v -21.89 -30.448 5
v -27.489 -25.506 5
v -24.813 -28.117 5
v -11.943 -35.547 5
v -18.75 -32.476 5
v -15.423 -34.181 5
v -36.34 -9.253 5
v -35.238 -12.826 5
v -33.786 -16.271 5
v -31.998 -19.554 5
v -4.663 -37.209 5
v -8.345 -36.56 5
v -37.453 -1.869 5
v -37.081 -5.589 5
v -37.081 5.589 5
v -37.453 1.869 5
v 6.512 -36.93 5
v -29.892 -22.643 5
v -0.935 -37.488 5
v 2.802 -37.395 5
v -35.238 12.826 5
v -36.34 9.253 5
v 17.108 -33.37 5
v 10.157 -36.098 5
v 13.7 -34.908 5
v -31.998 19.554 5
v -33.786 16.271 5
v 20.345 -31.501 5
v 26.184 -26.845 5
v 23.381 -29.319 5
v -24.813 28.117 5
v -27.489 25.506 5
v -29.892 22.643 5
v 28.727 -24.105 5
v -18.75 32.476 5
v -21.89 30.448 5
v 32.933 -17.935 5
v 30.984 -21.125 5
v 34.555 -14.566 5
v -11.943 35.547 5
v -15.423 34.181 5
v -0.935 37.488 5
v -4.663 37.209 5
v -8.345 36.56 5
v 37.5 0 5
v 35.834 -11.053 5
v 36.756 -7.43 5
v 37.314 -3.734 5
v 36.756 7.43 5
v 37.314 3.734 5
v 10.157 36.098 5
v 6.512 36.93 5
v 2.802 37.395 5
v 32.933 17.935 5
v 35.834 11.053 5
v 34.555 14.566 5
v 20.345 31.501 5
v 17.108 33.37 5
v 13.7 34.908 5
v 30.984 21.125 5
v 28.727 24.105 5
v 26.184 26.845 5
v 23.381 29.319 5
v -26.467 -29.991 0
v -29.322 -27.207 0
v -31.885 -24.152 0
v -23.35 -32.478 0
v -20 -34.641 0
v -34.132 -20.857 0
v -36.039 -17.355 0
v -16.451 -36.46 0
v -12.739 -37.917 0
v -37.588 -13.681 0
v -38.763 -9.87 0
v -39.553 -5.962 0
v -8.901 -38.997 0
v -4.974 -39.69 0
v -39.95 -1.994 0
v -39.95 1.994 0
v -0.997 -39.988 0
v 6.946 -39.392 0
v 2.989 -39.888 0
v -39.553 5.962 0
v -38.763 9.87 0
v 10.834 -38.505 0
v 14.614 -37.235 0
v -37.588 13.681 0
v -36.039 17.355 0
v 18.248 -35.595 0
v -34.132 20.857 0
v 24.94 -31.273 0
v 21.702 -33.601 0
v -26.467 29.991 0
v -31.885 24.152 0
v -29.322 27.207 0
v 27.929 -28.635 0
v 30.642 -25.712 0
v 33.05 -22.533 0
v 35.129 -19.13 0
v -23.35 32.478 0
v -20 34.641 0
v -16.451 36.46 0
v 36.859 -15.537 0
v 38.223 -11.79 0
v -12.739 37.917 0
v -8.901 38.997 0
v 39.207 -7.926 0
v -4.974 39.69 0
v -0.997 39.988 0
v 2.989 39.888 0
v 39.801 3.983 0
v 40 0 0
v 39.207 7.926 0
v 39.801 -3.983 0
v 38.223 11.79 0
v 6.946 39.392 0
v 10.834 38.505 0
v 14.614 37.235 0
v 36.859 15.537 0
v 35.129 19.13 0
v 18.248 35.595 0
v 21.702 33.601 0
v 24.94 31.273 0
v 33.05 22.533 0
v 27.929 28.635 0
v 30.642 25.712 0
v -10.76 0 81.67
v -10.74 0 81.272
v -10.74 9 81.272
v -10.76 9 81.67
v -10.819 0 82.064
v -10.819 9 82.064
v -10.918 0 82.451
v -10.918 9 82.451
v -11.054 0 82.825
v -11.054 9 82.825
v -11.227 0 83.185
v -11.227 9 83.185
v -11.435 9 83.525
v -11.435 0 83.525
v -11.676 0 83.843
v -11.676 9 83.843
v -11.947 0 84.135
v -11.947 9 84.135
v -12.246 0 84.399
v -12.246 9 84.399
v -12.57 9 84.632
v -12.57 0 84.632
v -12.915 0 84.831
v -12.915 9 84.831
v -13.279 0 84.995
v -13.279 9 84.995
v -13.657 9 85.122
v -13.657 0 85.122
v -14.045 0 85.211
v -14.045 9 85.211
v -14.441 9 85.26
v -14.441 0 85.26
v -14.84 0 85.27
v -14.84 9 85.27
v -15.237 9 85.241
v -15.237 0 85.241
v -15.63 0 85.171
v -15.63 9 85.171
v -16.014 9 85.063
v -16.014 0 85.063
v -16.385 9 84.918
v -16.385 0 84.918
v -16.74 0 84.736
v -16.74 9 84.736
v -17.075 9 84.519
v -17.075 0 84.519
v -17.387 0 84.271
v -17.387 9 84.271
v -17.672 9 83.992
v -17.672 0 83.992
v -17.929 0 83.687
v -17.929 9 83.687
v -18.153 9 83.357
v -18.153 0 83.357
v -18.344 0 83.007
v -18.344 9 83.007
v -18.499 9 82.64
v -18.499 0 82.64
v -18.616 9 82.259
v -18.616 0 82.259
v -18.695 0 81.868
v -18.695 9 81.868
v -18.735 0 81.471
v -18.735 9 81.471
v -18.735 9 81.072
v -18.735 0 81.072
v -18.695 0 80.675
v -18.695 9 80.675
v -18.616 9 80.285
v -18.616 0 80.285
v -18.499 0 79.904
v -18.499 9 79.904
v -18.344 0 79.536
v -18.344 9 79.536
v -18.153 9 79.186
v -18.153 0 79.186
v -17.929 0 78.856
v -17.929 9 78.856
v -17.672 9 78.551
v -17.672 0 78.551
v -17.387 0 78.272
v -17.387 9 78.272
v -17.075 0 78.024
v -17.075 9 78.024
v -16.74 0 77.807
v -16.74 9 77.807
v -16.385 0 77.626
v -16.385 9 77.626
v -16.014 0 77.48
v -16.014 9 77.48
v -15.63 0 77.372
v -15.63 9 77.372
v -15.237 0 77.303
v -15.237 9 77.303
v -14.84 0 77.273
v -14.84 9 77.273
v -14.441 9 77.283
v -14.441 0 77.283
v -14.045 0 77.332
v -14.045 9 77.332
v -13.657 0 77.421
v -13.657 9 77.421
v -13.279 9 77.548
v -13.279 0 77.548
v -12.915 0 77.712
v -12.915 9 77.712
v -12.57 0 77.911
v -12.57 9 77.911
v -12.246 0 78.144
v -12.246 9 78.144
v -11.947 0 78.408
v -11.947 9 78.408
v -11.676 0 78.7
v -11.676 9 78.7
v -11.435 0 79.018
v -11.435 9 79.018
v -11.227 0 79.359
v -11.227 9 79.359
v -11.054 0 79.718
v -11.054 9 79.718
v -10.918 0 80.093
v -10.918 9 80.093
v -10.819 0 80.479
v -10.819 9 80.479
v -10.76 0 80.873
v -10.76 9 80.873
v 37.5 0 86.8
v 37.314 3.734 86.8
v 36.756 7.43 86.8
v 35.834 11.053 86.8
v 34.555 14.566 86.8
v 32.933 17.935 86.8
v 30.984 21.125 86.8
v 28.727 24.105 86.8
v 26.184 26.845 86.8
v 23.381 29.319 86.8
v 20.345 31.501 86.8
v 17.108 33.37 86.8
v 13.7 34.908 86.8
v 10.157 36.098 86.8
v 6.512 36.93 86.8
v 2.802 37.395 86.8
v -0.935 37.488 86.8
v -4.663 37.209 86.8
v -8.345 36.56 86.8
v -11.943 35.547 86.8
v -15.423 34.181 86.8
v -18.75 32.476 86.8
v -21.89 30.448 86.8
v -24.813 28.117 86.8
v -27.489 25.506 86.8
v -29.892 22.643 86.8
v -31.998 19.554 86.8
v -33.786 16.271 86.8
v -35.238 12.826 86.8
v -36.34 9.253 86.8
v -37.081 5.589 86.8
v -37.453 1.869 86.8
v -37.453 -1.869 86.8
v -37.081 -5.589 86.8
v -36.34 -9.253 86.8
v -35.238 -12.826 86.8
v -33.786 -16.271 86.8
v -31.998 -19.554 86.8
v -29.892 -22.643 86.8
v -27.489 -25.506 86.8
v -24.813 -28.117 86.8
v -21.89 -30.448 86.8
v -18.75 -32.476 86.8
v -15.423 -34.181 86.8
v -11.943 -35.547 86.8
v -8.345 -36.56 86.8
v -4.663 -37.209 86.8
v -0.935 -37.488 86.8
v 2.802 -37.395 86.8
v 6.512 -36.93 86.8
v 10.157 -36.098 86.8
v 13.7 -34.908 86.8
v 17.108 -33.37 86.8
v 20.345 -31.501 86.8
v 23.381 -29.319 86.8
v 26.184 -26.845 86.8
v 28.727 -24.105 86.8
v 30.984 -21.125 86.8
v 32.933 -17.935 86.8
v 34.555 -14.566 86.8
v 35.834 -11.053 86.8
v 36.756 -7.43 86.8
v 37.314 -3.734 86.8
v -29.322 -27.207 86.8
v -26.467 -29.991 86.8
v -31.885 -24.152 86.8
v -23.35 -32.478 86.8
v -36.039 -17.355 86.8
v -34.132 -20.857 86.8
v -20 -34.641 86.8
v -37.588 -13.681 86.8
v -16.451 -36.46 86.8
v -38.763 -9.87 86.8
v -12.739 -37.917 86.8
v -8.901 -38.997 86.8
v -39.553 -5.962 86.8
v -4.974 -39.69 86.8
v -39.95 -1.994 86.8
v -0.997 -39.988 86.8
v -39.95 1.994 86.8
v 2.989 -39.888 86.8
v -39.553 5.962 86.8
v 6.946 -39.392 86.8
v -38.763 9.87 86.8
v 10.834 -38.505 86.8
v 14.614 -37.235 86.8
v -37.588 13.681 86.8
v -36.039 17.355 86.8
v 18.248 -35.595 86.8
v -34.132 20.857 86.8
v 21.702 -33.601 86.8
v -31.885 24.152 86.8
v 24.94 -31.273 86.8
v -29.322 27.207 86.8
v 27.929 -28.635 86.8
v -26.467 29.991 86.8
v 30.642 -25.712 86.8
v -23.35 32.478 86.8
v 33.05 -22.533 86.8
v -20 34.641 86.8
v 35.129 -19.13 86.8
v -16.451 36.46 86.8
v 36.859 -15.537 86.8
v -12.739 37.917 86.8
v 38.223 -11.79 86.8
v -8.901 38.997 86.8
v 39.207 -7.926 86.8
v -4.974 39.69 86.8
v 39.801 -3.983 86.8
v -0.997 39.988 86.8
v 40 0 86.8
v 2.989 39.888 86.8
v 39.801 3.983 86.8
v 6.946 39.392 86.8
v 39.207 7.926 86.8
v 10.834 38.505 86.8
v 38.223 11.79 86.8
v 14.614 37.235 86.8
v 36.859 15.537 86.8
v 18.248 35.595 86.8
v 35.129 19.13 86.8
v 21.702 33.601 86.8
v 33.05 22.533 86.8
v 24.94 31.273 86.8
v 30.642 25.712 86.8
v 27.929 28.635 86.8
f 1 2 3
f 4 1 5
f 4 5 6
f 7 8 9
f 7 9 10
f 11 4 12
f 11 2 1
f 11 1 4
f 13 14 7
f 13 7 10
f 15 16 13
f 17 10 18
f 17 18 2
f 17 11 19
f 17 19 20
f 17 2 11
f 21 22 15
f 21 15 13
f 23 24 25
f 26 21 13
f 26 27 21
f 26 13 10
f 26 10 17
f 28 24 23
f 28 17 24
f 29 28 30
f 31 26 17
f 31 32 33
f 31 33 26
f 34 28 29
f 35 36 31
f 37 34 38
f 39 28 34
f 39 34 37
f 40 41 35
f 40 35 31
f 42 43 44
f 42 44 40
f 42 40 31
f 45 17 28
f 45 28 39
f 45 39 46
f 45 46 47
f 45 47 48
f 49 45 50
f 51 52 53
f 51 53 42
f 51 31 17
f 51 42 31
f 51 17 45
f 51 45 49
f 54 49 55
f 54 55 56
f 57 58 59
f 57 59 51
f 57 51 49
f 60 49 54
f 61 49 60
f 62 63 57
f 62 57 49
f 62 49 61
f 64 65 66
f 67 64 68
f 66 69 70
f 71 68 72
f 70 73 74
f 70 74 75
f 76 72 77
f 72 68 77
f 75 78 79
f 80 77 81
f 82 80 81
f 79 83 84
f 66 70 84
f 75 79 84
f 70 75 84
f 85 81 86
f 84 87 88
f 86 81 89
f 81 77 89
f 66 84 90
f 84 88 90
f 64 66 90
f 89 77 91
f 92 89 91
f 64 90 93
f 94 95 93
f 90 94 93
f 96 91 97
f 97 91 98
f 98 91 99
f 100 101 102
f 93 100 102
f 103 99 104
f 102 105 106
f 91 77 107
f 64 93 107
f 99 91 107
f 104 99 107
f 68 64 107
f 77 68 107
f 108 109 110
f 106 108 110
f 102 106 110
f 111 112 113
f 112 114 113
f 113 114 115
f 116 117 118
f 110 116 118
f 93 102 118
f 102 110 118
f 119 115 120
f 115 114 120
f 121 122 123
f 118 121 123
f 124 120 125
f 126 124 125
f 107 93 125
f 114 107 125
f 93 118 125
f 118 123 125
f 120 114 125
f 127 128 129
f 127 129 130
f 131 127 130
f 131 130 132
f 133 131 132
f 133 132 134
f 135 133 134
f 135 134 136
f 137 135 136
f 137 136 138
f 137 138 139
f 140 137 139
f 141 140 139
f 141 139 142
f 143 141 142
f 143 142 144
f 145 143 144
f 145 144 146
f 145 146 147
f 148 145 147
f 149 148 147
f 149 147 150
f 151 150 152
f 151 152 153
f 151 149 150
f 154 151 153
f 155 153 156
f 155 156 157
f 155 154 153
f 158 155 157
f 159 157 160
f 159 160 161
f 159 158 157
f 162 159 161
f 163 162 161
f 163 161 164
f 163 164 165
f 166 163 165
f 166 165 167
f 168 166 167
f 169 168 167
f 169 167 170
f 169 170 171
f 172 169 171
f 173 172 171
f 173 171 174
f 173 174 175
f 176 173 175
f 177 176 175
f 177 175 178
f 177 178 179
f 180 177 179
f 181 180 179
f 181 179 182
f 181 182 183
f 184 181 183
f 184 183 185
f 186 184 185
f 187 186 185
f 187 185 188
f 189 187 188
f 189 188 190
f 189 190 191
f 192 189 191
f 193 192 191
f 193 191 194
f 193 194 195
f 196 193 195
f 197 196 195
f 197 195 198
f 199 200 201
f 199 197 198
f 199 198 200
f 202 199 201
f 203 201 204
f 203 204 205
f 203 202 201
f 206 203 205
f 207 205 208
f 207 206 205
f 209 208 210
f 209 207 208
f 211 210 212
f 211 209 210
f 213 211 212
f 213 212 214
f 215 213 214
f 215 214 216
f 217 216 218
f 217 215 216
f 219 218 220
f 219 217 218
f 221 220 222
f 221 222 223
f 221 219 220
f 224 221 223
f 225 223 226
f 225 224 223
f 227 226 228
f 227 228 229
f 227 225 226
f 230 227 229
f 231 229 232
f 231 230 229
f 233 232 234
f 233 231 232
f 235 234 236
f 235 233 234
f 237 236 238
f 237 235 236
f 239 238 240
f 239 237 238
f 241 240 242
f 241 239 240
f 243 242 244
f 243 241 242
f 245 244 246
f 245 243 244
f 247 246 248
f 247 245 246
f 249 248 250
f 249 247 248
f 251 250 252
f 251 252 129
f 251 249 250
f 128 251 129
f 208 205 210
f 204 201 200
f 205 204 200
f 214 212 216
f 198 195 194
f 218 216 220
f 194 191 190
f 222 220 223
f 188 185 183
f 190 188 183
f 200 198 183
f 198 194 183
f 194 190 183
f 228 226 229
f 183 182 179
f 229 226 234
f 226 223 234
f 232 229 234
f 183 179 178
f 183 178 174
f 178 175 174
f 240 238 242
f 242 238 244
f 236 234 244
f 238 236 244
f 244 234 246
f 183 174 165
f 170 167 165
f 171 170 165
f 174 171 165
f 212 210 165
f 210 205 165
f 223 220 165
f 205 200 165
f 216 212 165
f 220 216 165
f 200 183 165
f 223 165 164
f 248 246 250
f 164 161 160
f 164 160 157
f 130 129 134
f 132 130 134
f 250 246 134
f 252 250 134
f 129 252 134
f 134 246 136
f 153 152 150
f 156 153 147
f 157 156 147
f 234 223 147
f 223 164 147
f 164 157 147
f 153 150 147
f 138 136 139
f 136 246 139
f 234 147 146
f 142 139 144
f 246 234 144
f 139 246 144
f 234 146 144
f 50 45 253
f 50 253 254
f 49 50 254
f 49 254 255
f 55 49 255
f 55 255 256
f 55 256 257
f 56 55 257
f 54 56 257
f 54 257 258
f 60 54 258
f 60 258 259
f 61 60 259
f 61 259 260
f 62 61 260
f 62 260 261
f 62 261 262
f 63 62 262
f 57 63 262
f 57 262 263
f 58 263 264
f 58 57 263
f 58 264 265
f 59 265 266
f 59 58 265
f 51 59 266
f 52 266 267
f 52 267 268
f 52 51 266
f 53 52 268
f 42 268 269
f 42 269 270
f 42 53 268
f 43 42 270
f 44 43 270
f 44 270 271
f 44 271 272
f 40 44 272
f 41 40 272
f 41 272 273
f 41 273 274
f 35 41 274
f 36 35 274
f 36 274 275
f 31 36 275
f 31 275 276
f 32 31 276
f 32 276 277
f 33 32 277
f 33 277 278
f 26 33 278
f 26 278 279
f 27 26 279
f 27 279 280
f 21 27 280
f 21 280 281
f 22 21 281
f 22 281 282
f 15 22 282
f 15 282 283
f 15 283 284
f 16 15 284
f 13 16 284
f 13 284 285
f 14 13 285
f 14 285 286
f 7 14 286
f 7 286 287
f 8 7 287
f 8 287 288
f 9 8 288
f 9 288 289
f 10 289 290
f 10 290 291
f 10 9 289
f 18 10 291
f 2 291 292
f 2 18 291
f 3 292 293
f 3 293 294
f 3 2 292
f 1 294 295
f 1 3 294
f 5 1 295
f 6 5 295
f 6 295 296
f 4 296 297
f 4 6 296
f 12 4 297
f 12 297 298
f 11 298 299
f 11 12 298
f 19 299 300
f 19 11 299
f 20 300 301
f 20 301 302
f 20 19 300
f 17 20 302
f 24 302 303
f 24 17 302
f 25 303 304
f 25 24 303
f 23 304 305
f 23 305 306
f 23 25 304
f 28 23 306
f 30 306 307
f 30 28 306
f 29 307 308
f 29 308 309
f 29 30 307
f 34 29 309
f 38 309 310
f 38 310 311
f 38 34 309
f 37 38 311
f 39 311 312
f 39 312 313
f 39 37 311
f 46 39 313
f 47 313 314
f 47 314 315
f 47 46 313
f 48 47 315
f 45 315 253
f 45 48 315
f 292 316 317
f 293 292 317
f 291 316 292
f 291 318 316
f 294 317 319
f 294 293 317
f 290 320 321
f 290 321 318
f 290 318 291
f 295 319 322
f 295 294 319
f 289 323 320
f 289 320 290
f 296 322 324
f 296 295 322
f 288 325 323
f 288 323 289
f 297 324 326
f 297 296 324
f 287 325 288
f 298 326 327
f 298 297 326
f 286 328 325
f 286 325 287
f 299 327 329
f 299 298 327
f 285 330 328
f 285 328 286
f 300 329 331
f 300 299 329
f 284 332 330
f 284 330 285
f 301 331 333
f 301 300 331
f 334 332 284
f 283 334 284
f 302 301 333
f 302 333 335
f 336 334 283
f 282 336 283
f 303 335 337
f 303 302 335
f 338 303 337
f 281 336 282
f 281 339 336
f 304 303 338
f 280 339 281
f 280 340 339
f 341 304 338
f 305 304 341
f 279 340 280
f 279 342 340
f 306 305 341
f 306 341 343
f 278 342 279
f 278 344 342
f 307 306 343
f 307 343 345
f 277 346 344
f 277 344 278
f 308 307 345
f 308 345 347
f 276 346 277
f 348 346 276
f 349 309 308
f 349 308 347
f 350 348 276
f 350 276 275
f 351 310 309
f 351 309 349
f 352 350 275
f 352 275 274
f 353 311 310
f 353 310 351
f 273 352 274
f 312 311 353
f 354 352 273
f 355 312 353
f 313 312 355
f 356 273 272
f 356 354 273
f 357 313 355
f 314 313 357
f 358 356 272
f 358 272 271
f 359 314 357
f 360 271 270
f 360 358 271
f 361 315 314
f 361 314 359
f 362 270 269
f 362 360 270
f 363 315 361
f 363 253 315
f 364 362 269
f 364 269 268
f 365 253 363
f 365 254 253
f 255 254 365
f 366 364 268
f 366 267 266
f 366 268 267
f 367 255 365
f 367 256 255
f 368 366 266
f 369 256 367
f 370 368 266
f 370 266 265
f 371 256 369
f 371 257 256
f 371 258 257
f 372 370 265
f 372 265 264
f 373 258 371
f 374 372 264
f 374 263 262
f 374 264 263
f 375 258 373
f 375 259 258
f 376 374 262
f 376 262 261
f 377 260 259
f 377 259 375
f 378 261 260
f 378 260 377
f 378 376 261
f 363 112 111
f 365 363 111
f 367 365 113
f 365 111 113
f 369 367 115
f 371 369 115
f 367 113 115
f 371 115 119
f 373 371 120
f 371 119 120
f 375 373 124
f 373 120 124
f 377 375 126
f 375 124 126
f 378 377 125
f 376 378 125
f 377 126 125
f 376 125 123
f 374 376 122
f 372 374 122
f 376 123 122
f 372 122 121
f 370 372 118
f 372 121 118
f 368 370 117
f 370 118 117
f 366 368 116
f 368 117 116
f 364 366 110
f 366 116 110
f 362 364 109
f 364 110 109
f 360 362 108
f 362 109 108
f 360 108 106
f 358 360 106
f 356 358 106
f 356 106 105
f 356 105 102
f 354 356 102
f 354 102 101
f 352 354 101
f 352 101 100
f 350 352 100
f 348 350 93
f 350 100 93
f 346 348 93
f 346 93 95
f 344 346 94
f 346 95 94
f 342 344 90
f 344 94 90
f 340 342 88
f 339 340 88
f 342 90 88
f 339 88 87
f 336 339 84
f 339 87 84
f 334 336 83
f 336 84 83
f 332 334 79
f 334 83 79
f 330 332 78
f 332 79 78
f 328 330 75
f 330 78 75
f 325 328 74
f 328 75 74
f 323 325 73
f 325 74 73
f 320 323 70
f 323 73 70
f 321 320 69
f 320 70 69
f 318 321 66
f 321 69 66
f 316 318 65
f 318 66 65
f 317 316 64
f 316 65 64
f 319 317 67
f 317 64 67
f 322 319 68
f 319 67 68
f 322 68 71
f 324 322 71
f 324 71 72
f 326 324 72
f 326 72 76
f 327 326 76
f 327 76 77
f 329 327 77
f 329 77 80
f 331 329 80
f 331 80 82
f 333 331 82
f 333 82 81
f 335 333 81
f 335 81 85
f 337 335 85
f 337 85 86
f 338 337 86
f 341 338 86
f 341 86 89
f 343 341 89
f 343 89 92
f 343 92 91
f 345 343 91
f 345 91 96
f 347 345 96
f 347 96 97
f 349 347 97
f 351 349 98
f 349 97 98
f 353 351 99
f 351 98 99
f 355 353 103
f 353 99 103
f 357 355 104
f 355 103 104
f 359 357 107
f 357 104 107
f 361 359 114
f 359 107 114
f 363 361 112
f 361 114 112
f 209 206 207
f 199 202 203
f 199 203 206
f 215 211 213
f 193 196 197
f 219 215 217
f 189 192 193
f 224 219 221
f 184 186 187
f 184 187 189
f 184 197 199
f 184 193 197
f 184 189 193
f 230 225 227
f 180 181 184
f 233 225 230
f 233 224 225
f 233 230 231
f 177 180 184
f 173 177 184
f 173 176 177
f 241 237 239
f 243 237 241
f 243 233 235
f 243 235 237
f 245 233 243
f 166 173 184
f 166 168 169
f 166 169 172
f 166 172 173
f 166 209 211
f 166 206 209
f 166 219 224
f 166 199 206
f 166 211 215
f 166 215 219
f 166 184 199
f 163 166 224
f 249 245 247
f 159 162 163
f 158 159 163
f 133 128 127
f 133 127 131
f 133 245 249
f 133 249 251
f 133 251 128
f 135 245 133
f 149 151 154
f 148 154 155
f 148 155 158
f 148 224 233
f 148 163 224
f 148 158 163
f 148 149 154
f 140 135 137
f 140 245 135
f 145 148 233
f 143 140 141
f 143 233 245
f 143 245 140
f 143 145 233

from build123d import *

# Parameters (mm, degrees)
F0_R     = 40
F0_R_2   = 37.5
F2_DEPTH = 86.8
F1_R     = 37.5
F3_DEPTH = 5
F4_R     = 4
F5_DEPTH = 1
F6_DEPTH = 9


with BuildPart() as f2:
    # F0 (on Top) → F2 (new body)
    with BuildSketch(Plane.XY):
        Circle(F0_R)
        Circle(F0_R_2, mode=Mode.SUBTRACT)
    extrude(amount=F2_DEPTH)

    # F1 (on face) → F3 (join)
    with BuildSketch(Plane.XY):
        Circle(F1_R)
    extrude(amount=F3_DEPTH)


with BuildPart() as f5:
    # F4 (on Front) → F5 (new body)
    with BuildSketch(Plane.XZ):
        with Locations((-14.7400088608, 81.2715962529)):
            Circle(F4_R)
    extrude(amount=-F5_DEPTH)

    # F6 (add): a face of the model
    f6_faces = [f5.faces().sort_by_distance(p)[0] for p in [
        (-14.7400088608, 0, 81.2715962529),
    ]]
    extrude(f6_faces, amount=-F6_DEPTH)


solid = Compound([f2.part, f5.part])
